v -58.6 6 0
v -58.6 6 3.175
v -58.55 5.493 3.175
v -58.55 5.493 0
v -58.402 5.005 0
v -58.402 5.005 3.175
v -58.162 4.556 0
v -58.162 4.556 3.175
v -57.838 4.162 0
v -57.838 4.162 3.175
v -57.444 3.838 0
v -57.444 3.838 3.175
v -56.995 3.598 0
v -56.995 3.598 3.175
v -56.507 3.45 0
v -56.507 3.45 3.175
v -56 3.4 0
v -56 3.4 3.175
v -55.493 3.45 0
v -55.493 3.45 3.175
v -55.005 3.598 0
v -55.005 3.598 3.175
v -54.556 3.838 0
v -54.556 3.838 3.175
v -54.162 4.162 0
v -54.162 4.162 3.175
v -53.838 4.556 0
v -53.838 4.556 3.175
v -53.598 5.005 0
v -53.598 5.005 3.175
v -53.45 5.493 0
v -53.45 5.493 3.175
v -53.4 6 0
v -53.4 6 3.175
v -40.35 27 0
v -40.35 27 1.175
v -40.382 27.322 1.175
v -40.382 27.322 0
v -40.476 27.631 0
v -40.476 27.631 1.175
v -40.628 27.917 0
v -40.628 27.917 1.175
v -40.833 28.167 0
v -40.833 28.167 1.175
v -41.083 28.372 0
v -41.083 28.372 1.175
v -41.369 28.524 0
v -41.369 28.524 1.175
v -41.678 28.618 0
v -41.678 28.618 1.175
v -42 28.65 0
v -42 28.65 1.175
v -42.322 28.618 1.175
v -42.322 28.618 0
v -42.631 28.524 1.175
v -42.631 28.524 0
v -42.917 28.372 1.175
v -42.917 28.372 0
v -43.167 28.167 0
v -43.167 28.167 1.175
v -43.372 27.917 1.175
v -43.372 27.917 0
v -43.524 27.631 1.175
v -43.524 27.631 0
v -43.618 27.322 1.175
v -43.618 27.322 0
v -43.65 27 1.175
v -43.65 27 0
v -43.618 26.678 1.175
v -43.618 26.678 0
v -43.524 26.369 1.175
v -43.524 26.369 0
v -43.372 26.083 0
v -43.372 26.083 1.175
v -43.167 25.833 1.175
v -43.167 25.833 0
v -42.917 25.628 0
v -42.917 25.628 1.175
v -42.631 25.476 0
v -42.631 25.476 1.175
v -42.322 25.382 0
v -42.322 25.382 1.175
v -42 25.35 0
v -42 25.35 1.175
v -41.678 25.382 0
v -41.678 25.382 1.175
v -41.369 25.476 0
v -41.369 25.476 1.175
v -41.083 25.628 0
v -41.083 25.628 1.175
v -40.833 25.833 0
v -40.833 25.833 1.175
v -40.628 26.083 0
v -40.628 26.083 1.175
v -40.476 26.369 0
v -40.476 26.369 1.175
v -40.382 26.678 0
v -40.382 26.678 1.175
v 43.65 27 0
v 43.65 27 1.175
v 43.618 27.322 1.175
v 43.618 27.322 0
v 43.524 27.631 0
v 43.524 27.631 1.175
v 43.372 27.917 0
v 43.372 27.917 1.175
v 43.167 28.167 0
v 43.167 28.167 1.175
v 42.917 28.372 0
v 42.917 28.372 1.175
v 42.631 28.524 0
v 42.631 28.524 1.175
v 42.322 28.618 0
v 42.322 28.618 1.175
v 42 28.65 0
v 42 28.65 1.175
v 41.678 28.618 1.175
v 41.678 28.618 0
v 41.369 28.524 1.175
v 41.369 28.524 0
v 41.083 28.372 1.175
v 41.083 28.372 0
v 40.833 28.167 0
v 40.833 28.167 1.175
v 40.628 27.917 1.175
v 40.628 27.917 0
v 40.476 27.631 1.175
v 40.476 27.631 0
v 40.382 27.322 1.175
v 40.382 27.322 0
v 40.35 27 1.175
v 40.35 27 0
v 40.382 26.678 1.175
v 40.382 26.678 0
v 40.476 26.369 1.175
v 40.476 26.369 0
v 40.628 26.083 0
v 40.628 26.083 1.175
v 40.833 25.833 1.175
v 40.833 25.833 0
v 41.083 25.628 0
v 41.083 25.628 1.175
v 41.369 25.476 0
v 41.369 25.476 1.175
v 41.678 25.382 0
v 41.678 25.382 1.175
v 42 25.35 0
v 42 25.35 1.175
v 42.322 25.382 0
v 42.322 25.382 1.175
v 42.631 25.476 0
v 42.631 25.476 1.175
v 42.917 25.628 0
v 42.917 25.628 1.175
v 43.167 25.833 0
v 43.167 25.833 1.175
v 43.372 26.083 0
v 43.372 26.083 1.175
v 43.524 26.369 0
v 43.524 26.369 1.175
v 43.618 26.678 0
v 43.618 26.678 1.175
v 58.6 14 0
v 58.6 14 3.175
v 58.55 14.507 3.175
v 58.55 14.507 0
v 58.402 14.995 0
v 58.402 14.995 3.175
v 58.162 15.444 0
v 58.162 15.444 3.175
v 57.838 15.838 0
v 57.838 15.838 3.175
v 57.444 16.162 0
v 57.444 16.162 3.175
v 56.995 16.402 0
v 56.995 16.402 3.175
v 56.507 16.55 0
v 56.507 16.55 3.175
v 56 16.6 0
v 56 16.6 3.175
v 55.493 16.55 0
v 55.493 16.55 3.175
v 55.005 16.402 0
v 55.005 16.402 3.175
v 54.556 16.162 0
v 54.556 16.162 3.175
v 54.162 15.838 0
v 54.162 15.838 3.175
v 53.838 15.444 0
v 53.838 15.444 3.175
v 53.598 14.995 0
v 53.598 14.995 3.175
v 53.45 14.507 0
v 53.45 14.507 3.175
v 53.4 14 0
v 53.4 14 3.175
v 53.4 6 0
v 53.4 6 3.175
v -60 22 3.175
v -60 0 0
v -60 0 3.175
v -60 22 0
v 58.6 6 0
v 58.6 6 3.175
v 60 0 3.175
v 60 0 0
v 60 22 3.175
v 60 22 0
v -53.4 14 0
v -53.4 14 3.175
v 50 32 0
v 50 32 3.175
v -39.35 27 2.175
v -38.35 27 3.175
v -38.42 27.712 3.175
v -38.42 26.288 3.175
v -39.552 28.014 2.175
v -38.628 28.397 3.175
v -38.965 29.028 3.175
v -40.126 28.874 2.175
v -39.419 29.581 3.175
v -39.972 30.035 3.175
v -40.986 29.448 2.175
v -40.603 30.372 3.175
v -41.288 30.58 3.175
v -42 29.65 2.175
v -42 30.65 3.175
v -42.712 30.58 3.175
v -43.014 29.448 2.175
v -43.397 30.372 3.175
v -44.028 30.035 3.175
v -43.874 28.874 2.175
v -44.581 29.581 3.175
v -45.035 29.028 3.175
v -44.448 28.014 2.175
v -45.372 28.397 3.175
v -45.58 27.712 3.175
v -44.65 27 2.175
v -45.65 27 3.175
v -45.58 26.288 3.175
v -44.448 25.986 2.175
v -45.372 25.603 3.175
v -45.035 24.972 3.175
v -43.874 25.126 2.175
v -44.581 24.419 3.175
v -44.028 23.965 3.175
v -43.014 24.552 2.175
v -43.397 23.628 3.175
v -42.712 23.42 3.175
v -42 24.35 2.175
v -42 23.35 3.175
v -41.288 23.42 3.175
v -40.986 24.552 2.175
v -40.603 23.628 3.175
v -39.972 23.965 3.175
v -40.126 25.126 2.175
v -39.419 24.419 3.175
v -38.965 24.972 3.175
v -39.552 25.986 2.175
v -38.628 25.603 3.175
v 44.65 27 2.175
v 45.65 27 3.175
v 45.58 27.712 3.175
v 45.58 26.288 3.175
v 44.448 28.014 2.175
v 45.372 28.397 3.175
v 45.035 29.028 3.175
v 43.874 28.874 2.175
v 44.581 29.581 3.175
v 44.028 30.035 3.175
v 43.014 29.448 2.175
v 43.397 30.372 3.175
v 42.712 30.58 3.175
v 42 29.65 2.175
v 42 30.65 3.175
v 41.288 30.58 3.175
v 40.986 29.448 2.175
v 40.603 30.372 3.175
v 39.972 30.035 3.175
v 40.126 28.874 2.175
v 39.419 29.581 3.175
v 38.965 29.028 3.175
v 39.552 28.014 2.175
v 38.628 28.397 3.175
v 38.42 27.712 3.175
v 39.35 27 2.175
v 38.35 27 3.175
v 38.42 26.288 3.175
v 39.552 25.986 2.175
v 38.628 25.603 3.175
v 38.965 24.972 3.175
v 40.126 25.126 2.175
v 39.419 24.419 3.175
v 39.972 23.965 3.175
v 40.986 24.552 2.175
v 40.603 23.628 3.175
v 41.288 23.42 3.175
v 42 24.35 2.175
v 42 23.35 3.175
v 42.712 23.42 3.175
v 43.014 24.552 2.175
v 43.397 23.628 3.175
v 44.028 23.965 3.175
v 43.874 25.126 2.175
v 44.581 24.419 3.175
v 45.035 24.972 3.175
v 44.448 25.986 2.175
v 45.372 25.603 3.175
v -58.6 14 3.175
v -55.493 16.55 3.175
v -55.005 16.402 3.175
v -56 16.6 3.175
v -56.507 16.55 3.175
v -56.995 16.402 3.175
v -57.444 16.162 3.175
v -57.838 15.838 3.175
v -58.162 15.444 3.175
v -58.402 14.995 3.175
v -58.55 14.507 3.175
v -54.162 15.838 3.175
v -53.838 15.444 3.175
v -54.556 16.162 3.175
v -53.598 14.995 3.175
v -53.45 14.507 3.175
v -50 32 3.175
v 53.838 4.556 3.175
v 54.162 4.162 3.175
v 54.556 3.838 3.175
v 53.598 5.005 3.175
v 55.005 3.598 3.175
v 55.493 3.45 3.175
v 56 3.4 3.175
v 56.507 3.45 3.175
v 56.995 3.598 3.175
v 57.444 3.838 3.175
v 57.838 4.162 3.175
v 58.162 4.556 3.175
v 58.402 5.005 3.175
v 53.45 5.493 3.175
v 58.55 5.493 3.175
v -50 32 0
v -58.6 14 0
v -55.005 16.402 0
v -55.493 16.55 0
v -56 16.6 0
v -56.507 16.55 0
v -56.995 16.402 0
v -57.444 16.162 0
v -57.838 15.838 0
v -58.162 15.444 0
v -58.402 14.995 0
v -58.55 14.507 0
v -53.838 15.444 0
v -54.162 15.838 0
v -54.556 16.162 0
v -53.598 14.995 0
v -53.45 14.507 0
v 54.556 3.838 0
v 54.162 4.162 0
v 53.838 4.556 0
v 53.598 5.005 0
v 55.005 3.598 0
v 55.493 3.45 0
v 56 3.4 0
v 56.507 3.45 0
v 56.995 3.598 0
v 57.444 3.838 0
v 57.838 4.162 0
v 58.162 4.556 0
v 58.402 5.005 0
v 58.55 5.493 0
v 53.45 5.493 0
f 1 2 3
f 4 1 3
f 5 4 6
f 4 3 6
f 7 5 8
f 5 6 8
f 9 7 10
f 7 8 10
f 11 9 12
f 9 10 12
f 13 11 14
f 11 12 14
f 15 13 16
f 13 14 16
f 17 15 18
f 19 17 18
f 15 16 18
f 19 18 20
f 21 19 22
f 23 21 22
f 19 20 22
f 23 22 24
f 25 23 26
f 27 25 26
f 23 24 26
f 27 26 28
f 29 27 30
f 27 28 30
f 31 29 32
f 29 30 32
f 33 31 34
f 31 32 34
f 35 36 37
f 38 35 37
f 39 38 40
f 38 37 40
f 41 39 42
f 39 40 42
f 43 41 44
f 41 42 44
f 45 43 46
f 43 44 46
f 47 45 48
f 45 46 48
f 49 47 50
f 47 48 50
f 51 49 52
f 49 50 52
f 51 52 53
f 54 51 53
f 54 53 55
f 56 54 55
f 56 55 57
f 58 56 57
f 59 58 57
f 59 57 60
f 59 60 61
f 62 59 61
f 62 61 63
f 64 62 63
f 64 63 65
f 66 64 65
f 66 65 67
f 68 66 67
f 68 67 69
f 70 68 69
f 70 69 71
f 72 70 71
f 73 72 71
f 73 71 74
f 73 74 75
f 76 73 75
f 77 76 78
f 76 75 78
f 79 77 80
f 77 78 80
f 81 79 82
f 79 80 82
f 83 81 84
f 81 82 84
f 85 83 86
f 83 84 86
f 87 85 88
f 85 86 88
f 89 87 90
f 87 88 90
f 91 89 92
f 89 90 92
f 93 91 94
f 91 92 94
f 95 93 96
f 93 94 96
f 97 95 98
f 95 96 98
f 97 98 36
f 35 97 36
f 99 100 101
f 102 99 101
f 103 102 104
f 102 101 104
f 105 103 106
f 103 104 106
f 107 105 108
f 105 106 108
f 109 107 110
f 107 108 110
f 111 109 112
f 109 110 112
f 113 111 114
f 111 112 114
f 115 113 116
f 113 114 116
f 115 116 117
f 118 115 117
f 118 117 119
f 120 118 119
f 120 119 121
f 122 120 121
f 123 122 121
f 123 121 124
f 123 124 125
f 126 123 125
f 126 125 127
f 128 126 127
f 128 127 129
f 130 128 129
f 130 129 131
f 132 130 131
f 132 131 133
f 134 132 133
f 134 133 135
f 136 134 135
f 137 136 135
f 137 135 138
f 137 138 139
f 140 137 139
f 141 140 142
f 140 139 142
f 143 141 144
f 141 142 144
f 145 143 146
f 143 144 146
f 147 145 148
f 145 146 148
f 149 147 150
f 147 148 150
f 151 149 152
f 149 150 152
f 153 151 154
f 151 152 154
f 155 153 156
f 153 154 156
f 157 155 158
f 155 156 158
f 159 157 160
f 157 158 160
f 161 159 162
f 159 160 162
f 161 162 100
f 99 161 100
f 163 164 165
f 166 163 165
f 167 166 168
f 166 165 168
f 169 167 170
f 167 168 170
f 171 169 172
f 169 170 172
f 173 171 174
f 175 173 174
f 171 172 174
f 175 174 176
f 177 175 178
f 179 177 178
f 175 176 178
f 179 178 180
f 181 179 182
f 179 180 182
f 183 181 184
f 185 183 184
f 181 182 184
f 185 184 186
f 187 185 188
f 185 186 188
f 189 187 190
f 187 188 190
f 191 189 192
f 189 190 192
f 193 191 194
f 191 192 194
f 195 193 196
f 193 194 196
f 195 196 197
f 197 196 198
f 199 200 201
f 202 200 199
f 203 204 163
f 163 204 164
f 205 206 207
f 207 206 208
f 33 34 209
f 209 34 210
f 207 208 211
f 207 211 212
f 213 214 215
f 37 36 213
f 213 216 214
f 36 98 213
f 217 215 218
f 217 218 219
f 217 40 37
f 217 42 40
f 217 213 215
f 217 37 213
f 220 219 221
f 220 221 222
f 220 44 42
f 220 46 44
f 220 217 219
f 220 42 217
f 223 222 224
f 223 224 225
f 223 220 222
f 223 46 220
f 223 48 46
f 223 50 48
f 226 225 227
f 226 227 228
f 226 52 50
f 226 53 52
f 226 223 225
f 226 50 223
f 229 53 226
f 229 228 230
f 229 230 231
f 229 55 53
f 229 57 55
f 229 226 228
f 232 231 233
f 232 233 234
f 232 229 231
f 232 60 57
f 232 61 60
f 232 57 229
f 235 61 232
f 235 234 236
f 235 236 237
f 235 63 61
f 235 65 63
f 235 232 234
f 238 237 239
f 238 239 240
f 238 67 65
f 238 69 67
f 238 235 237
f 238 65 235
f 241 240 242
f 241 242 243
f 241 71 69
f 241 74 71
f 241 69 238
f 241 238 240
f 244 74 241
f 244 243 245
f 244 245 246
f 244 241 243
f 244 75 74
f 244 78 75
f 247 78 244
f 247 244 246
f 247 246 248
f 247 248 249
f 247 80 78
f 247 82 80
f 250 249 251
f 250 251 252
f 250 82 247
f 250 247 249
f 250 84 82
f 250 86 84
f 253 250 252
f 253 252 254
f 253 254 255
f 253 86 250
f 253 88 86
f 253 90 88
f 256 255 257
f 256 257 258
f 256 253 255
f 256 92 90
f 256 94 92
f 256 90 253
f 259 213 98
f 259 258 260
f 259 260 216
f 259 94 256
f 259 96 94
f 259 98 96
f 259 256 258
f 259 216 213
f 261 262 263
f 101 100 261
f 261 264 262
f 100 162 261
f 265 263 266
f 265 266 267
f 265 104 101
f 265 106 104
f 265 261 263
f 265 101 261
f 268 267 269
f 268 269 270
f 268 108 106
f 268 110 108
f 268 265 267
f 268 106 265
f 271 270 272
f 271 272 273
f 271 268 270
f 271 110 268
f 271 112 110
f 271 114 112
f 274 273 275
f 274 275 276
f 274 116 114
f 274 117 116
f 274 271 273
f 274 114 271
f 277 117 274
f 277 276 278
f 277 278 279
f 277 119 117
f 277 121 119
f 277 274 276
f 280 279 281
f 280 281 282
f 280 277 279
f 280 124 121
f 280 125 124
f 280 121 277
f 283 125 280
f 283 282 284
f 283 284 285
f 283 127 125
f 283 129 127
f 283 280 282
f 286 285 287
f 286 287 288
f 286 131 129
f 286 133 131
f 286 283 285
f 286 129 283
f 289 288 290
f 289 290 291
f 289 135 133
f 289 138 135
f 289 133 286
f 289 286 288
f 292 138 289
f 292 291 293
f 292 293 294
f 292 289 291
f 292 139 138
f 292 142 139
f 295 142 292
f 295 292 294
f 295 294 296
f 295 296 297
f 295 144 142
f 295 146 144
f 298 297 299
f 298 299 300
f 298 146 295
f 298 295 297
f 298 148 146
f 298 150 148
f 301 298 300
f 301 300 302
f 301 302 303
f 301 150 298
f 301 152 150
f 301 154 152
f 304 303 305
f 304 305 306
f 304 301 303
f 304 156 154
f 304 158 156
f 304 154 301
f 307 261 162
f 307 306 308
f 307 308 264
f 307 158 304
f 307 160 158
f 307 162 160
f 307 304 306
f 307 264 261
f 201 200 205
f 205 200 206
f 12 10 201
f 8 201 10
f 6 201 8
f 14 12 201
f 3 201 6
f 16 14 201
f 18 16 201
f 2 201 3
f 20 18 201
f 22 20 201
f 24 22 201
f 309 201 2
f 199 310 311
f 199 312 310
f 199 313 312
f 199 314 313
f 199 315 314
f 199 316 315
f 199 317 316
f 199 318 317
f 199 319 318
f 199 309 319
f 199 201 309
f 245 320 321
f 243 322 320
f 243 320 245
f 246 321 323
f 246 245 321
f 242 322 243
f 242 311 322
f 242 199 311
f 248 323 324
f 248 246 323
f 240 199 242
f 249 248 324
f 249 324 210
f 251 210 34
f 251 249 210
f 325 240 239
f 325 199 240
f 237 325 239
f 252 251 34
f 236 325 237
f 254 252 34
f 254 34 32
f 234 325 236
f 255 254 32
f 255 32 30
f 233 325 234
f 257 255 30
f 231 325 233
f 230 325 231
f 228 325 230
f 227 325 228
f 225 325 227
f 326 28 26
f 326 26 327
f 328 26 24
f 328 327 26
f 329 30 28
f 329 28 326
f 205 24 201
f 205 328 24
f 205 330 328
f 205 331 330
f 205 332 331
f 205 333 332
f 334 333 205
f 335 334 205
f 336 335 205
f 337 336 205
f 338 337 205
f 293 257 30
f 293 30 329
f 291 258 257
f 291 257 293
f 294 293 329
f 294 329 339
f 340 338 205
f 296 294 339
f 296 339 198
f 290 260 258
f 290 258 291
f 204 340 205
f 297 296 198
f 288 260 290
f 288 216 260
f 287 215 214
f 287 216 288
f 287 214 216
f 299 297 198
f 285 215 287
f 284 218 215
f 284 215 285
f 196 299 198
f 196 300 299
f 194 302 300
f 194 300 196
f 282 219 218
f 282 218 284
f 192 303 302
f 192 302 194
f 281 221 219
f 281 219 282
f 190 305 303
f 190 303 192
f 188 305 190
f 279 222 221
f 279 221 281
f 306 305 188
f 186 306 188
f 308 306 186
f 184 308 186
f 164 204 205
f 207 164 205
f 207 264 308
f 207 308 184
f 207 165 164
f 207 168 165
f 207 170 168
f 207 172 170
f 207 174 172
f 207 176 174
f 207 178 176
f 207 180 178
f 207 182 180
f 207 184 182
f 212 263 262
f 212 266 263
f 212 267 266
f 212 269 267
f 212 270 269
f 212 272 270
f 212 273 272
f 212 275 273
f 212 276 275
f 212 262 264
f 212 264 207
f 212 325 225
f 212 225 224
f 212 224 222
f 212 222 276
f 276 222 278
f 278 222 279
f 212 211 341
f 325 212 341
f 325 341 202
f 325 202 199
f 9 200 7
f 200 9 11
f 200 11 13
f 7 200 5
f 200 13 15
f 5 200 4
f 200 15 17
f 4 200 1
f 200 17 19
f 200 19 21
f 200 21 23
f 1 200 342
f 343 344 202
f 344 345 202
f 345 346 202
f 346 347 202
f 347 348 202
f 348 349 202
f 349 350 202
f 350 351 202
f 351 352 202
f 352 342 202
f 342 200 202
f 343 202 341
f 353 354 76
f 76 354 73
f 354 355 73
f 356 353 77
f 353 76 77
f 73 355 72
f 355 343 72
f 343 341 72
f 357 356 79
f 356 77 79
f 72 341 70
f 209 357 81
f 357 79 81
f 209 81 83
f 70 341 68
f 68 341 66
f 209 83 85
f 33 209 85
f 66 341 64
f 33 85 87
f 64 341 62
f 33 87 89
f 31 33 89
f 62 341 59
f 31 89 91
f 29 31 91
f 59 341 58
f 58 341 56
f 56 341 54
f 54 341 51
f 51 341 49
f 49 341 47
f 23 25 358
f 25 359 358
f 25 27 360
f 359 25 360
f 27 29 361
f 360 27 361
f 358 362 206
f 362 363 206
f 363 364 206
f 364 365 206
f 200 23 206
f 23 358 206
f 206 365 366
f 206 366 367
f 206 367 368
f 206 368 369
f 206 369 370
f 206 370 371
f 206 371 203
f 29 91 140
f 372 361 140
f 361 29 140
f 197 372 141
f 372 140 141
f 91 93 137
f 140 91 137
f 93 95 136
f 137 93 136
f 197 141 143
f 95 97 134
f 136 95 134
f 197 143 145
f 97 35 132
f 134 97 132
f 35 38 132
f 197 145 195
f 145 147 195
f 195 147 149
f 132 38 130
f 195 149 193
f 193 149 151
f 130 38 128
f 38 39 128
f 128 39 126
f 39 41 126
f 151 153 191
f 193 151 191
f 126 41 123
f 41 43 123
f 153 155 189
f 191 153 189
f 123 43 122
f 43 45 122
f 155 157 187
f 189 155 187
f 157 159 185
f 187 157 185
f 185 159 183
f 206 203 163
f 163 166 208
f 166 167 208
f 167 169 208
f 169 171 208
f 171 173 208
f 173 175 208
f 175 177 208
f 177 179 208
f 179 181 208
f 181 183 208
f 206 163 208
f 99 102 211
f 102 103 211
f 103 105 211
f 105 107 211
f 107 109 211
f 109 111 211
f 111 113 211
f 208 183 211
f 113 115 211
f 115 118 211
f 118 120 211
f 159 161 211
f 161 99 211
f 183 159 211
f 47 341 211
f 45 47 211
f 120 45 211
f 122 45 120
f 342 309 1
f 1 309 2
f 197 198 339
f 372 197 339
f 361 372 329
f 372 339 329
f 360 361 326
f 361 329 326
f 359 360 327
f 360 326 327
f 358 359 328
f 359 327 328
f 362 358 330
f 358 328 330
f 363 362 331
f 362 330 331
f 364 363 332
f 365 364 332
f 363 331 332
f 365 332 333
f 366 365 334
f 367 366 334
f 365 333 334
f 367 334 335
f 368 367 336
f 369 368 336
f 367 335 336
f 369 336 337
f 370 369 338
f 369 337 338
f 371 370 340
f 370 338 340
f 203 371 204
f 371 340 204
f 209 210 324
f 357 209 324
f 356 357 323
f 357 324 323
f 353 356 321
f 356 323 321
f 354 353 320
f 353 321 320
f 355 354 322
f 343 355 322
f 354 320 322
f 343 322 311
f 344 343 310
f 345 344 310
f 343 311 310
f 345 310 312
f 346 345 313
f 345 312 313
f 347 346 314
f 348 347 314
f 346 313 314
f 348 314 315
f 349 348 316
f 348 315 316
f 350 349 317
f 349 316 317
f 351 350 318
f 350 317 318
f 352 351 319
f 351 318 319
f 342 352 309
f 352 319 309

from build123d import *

# Parameters (mm, degrees)
F0_W     = 60
F0_H     = 32
F1_DEPTH = 3.175
F2_R     = 1.65
F3_DEPTH = 3.176
F4_SIZE  = 2
F5_SIZE  = 10


with BuildPart() as f1:
    # F0 (on Top) → F1 (new body)
    with BuildSketch(Plane.XY):
        with Locations((-30, 16)):
            Rectangle(F0_W, F0_H)
        with Locations((30, 16)):
            Rectangle(F0_W, F0_H)
    extrude(amount=F1_DEPTH)

    # F2 (on face) → F3 (cut, through all)
    with BuildSketch(Plane.XY.offset(3.175)):
        with BuildLine():
            ThreePointArc((-58.6, 14), (-56, 11.4), (-53.4, 14))
            ThreePointArc((-53.4, 14), (-56, 16.6), (-58.6, 14))
        make_face()
        with Locations((-42, 27)):
            Circle(F2_R)
        with Locations((42, 27)):
            Circle(F2_R)
        with BuildLine():
            ThreePointArc((53.4, 14), (56, 11.4), (58.6, 14))
            ThreePointArc((58.6, 14), (56, 16.6), (53.4, 14))
        make_face()
        with BuildLine():
            Line((-53.4, 6), (-53.4, 14))
            ThreePointArc((-53.4, 14), (-56, 11.4), (-58.6, 14))
            Line((-58.6, 14), (-58.6, 6))
            ThreePointArc((-58.6, 6), (-56, 8.6), (-53.4, 6))
        make_face()
        with BuildLine():
            Line((-58.6, 6), (-53.4, 6))
            ThreePointArc((-53.4, 6), (-56, 8.6), (-58.6, 6))
        make_face()
        with BuildLine():
            ThreePointArc((-58.6, 6), (-56, 3.4), (-53.4, 6))
            Line((-53.4, 6), (-58.6, 6))
        make_face()
        with BuildLine():
            Line((58.6, 6), (58.6, 14))
            ThreePointArc((58.6, 14), (56, 11.4), (53.4, 14))
            Line((53.4, 14), (53.4, 6))
            ThreePointArc((53.4, 6), (56, 8.6), (58.6, 6))
        make_face()
        with BuildLine():
            Line((53.4, 6), (58.6, 6))
            ThreePointArc((58.6, 6), (56, 8.6), (53.4, 6))
        make_face()
        with BuildLine():
            ThreePointArc((53.4, 6), (56, 3.4), (58.6, 6))
            Line((58.6, 6), (53.4, 6))
        make_face()
    extrude(amount=-F3_DEPTH, mode=Mode.SUBTRACT)

    # F4
    f4_edges = [f1.edges().sort_by_distance(p)[0] for p in [
        (-43.65, 27, 3.175),
        (40.35, 27, 3.175),
    ]]
    chamfer(f4_edges, length=F4_SIZE)

    # F5
    f5_edges = [f1.edges().sort_by_distance(p)[0] for p in [
        (-60, 32, 1.5875),
        (60, 32, 1.5875),
    ]]
    chamfer(f5_edges, length=F5_SIZE)


solid = f1.part
